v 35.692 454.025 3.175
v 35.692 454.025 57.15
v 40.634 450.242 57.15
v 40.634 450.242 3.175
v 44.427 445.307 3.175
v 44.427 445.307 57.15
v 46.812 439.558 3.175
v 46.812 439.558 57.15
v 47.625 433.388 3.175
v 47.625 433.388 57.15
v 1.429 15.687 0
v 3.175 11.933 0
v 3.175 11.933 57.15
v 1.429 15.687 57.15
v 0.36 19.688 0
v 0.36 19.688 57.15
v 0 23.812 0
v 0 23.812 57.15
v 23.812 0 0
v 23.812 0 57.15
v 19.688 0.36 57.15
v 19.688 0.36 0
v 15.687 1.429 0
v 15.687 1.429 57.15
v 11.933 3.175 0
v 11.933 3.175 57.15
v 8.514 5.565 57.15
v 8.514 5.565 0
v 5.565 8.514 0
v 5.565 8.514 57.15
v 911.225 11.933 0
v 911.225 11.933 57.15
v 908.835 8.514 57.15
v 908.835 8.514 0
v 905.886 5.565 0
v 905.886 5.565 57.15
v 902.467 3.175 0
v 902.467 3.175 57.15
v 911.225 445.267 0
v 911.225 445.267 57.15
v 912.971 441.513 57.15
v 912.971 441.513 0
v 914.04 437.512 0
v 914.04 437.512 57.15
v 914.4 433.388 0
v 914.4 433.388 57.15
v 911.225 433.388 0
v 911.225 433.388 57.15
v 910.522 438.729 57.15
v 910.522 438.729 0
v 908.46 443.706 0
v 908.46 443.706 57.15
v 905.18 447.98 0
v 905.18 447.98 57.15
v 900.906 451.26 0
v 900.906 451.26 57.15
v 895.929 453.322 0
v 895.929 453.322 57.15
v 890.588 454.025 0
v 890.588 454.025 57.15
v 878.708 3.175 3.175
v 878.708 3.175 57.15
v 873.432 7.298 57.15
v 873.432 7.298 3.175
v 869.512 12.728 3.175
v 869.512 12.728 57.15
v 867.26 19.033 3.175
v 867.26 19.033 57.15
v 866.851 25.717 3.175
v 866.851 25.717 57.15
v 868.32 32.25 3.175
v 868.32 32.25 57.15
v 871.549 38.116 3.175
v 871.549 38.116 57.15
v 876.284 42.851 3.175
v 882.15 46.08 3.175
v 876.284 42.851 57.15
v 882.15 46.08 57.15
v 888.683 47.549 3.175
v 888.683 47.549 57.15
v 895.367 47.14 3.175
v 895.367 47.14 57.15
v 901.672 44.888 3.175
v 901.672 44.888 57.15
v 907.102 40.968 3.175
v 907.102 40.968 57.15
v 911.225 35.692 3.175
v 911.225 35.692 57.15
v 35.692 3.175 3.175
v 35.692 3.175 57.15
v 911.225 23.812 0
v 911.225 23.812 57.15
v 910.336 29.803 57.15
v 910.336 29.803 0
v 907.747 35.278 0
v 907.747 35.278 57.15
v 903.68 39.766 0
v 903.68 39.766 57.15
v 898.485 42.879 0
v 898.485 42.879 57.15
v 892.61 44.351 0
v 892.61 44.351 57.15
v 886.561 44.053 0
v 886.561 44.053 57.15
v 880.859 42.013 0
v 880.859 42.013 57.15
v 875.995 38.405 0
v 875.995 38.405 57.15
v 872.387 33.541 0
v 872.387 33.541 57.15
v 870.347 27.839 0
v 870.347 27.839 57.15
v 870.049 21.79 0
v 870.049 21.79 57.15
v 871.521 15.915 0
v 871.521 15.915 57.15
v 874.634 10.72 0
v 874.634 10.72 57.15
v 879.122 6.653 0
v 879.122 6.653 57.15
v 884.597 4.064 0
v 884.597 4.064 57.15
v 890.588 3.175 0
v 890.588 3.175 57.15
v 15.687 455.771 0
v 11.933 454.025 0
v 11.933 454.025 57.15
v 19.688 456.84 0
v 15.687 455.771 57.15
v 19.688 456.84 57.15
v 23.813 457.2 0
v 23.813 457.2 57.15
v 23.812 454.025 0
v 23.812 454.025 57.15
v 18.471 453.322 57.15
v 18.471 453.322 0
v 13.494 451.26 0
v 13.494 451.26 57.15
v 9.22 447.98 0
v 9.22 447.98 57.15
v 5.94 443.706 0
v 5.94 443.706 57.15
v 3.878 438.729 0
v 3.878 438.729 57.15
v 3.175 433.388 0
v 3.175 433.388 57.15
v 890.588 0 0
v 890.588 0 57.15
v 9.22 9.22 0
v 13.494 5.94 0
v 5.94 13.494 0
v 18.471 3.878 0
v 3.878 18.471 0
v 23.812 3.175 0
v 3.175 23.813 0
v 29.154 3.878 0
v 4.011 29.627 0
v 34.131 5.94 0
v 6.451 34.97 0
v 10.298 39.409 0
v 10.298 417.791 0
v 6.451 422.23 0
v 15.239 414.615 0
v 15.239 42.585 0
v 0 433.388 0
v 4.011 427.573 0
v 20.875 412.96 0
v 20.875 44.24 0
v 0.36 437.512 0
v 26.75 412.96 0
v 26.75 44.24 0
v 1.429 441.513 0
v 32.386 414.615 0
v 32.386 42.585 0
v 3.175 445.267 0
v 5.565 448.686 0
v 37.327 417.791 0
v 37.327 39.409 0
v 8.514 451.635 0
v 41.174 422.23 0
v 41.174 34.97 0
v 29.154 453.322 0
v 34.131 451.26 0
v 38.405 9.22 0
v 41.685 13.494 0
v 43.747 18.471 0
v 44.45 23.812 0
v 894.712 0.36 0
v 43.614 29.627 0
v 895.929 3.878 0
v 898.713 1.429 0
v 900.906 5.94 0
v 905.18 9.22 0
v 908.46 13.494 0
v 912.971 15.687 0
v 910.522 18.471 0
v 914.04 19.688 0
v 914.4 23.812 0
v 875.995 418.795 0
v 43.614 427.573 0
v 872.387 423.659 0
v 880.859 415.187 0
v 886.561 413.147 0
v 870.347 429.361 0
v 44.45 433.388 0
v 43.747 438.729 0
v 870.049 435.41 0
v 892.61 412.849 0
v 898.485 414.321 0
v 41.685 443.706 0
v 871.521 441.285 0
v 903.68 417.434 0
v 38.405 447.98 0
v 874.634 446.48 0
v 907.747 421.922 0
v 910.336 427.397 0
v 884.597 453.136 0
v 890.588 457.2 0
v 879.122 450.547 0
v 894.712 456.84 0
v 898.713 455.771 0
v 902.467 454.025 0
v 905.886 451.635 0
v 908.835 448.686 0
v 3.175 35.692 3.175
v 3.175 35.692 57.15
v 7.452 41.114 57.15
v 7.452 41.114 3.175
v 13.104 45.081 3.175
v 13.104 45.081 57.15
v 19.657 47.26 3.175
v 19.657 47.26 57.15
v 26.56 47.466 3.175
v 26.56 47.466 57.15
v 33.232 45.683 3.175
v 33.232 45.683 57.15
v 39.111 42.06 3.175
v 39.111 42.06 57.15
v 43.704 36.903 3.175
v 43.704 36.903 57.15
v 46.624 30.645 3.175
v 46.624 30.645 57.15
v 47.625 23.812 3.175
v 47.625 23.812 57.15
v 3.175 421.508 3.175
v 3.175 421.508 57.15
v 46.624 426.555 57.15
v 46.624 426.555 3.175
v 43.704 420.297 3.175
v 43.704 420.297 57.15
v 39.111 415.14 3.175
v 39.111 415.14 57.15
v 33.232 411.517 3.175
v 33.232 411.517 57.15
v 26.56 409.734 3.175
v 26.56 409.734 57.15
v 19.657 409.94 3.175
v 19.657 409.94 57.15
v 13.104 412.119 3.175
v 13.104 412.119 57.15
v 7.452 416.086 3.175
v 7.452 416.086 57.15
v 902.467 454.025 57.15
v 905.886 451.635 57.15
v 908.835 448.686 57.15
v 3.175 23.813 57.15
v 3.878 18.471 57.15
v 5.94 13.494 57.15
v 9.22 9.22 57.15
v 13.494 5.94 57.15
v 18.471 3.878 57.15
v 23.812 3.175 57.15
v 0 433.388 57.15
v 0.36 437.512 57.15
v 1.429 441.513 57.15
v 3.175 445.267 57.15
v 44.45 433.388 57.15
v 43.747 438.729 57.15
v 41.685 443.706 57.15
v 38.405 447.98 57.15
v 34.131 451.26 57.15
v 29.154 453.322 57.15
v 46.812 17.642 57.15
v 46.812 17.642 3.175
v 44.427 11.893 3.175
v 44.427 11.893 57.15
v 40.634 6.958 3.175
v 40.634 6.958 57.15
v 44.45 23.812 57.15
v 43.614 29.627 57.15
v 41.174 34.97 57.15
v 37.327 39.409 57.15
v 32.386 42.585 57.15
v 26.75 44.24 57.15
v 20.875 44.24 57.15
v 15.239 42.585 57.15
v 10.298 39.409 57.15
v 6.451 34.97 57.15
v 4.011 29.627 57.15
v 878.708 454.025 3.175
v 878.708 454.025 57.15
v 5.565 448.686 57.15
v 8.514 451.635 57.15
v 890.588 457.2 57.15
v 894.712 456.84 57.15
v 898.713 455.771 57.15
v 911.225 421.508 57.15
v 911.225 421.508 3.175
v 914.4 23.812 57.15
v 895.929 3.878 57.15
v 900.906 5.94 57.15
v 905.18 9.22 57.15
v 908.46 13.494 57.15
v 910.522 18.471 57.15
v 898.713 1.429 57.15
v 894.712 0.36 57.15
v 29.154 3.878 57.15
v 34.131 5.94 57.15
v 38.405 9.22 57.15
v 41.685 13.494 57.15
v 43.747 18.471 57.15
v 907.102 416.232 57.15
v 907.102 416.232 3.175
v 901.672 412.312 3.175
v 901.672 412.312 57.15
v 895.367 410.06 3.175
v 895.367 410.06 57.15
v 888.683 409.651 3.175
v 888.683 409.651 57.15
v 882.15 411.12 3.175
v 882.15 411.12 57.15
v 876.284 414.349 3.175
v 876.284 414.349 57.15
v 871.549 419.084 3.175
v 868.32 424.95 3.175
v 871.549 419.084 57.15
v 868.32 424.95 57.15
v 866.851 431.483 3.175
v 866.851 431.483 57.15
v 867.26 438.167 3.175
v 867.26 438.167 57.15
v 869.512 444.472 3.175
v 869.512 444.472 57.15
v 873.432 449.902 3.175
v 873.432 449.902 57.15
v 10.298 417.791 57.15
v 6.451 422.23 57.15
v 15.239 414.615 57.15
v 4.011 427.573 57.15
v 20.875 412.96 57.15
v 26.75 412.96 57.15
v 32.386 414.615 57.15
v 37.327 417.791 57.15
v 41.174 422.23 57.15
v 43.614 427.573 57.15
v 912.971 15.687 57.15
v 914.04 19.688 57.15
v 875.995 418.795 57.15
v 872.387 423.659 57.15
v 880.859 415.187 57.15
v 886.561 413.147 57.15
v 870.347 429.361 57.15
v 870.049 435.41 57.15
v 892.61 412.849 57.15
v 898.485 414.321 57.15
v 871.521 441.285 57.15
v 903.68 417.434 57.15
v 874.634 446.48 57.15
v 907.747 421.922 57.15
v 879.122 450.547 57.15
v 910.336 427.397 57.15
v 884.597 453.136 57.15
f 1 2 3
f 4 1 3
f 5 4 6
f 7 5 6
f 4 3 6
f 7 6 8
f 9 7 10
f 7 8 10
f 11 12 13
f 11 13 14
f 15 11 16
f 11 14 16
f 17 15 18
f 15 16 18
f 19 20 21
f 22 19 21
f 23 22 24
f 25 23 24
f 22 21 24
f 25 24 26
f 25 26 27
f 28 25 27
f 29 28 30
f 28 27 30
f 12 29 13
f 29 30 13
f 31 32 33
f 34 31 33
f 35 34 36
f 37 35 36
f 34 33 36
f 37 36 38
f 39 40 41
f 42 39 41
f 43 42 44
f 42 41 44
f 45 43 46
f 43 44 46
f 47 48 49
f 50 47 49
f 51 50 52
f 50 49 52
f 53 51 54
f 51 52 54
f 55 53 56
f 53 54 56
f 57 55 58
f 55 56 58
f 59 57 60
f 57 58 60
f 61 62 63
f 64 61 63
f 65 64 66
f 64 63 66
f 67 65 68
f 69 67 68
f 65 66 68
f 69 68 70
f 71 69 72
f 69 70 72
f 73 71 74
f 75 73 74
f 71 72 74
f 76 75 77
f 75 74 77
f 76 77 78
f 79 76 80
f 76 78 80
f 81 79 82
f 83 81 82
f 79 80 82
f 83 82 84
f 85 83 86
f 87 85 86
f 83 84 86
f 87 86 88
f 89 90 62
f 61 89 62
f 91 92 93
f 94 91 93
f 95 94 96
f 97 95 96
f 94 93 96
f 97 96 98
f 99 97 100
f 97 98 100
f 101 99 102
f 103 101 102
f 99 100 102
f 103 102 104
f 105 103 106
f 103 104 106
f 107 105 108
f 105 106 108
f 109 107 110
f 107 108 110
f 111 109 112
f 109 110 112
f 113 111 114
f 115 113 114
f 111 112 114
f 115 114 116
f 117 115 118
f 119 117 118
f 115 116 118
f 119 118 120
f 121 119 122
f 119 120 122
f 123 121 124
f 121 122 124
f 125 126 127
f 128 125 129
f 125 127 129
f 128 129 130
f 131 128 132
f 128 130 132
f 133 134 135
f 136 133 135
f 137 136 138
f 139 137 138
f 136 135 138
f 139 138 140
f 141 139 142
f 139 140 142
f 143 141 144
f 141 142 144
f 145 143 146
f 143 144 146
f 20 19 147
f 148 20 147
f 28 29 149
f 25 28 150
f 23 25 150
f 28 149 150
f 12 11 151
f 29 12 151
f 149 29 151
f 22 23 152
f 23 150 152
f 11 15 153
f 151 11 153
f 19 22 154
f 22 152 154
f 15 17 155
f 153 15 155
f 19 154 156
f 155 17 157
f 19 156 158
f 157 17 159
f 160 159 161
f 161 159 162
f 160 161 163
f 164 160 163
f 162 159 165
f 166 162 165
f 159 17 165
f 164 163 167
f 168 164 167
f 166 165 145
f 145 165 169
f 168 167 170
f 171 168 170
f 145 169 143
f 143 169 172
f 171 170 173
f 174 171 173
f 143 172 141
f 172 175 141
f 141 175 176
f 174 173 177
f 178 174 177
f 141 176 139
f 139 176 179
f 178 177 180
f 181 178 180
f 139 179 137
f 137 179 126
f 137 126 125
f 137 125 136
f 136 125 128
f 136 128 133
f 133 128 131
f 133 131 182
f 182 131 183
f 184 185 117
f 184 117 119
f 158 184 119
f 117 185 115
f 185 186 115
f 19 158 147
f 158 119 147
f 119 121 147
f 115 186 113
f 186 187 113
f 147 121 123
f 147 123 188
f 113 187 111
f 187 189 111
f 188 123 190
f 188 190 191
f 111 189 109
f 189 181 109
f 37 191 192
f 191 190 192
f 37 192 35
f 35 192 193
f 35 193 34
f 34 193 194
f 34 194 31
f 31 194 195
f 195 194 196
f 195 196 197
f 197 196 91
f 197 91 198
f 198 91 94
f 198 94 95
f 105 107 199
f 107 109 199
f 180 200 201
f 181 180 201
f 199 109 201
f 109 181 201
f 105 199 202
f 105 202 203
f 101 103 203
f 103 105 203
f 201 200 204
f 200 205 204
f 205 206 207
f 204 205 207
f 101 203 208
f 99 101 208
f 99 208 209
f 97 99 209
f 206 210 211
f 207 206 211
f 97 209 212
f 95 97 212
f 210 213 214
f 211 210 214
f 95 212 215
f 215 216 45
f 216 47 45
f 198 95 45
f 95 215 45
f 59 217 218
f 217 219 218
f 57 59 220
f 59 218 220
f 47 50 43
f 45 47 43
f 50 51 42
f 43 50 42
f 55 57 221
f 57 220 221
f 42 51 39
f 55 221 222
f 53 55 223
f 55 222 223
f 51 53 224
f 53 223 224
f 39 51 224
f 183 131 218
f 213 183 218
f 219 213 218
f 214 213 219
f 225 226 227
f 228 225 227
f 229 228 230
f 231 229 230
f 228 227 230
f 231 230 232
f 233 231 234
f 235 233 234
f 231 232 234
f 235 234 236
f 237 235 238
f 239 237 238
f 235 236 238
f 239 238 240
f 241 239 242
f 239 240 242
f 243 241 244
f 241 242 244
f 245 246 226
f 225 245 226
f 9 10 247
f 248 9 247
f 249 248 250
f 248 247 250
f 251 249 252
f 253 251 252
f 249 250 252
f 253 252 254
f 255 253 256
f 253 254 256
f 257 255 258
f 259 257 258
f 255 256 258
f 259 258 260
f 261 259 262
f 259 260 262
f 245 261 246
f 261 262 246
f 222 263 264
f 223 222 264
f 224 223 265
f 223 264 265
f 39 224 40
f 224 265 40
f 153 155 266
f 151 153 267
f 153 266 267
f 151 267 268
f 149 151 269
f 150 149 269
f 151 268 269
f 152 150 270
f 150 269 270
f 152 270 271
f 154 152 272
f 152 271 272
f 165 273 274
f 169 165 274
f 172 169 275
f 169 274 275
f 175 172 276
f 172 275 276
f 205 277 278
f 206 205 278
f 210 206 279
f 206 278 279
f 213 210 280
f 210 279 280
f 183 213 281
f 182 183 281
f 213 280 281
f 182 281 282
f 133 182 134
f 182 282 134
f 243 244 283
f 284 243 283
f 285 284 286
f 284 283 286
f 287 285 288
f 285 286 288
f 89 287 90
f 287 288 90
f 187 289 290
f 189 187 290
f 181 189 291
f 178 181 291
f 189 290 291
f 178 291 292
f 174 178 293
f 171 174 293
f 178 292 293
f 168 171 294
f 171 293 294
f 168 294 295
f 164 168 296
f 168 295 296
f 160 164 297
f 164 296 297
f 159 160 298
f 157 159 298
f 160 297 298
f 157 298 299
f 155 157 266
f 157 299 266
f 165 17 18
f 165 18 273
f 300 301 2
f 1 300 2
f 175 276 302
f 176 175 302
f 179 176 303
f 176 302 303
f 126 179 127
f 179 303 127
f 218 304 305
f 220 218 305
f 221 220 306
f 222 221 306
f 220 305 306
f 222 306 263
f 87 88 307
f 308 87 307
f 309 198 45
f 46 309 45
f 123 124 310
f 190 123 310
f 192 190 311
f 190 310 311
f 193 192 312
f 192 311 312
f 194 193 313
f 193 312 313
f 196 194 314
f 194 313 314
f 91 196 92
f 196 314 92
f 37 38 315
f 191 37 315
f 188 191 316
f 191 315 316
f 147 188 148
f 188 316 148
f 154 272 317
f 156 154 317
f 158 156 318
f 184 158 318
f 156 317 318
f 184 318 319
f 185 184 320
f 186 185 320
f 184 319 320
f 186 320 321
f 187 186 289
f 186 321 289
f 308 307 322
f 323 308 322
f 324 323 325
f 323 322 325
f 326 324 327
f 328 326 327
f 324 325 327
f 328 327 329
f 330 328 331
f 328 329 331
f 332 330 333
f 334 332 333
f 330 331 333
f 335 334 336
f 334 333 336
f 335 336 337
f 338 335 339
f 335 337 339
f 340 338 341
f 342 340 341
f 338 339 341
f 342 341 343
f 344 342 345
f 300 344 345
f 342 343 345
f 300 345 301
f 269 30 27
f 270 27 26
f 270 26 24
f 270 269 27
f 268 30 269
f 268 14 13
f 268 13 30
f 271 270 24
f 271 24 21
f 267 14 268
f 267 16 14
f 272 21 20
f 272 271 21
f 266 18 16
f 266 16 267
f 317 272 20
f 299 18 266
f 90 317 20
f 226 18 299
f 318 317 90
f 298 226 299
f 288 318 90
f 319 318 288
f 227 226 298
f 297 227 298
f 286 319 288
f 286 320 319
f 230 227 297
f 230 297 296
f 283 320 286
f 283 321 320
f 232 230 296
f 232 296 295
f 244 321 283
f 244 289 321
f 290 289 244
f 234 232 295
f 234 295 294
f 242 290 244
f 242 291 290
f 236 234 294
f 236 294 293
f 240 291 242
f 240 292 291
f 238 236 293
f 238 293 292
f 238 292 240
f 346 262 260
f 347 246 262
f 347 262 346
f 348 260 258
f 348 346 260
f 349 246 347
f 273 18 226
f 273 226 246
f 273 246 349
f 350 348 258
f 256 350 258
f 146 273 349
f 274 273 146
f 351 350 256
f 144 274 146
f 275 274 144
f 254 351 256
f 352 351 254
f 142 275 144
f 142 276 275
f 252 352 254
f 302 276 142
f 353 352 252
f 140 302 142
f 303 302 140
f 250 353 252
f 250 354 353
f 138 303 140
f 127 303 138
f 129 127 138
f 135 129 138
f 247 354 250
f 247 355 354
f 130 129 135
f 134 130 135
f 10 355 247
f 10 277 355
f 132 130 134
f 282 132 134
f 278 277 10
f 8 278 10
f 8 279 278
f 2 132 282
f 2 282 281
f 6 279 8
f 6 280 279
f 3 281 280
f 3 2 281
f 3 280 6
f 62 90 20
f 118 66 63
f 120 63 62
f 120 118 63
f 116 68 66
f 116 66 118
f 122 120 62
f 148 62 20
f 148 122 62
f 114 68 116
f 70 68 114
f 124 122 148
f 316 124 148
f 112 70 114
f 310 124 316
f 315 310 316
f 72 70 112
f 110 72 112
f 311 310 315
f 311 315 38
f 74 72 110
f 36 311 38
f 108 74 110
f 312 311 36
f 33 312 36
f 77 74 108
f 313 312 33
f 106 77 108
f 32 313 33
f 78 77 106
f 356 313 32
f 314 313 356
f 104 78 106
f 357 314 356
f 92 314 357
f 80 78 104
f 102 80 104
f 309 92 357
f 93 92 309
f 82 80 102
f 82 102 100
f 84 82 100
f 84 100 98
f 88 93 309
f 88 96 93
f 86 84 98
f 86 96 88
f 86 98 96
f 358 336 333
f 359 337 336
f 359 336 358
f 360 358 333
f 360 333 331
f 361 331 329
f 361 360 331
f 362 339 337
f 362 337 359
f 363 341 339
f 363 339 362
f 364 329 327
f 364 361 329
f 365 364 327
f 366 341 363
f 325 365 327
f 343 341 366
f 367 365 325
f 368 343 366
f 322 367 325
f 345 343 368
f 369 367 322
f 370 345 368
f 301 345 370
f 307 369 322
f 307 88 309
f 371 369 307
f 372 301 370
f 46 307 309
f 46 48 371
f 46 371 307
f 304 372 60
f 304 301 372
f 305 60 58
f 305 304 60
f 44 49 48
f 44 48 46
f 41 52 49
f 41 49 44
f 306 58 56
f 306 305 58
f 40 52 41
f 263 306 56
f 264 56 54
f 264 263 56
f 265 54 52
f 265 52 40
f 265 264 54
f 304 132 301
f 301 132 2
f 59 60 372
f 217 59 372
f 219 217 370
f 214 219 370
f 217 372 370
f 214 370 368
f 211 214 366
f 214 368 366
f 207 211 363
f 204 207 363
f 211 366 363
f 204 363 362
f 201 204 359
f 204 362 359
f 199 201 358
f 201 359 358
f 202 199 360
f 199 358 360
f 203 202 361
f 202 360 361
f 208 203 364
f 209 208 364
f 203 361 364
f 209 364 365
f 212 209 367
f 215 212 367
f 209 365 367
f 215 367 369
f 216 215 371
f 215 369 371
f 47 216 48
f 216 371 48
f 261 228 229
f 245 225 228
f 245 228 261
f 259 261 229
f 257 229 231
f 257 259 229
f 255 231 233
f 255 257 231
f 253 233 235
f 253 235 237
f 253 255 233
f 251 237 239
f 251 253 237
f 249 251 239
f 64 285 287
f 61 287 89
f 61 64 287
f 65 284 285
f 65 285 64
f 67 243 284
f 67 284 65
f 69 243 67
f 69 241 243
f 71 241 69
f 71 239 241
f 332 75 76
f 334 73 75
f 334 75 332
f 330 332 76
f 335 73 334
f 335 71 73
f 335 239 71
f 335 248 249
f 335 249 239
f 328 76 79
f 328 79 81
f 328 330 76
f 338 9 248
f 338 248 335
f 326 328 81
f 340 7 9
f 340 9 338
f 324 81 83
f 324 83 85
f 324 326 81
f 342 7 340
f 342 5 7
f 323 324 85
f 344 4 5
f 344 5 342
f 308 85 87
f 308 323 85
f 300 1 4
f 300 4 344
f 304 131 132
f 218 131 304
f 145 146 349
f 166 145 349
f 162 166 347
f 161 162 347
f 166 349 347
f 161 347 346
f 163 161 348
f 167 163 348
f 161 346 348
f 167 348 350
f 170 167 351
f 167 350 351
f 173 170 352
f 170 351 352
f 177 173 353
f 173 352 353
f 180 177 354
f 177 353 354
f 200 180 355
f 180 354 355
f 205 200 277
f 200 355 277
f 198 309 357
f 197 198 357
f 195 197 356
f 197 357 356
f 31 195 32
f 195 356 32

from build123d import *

# Parameters (mm, degrees)
F2_W     = 914.4
F2_H     = 457.2
F3_DEPTH = 57.15
F5_DEPTH = 53.975
F6_DEPTH = 57.15


# Not quite as in the source:
# - a length typed as a fraction of an inch, garbled in the dataset ("3 / 203.2 mm" for 3/8 in), is restored


with BuildPart() as f3:
    # F2 (on Top) → F3 (new body)
    with BuildSketch(Plane.XY):
        with Locations((457.2, 228.6)):
            Rectangle(F2_W, F2_H)
    extrude(amount=F3_DEPTH)

    # F4 (on face) → F5 (cut)
    with BuildSketch(Plane.XY.offset(57.15)):
        with BuildLine():
            ThreePointArc((47.625, 23.8125), (44.4270821412, 11.8930134592), (35.692262203, 3.175))
            Line((35.692262203, 3.175), (878.707737797, 3.175))
            ThreePointArc((878.707737797, 3.175), (873.749519773, 40.650480227), (911.225, 35.692262203))
            Line((911.225, 35.692262203), (911.225, 421.507737797))
            ThreePointArc((911.225, 421.507737797), (873.749519773, 416.549519773), (878.707737797, 454.025))
            Line((878.707737797, 454.025), (35.692262203, 454.025))
            ThreePointArc((35.692262203, 454.025), (44.4270821412, 445.3069865408), (47.625, 433.3875))
            ThreePointArc((47.625, 433.3875), (29.9608610621, 410.3824394154), (3.175, 421.507737797))
            Line((3.175, 421.507737797), (3.175, 35.692262203))
            ThreePointArc((3.175, 35.692262203), (29.9608610621, 46.8175605846), (47.625, 23.8125))
        make_face()
    extrude(amount=-F5_DEPTH, mode=Mode.SUBTRACT)

    # F4 (on face) → F6 (cut)
    with BuildSketch(Plane.XY.offset(57.15)):
        with BuildLine():
            Line((11.932737797, 3.175), (3.175, 3.175))
            Line((3.175, 3.175), (3.175, 11.932737797))
            ThreePointArc((3.175, 11.932737797), (0.8074394304, 17.6641388819), (0, 23.8124998841))
            Line((0, 23.8124998841), (0, 0))
            Line((0, 0), (23.8125, 0))
            ThreePointArc((23.8125, 0), (17.6641389379, 0.8074394154), (11.932737797, 3.175))
        make_face()
        with BuildLine():
            Line((3.175, 11.932737797), (3.175, 3.175))
            Line((3.175, 3.175), (11.932737797, 3.175))
            ThreePointArc((11.932737797, 3.175), (6.974519773, 6.974519773), (3.175, 11.932737797))
        make_face()
        with BuildLine():
            ThreePointArc((3.175, 23.8125001882), (9.2195837367, 9.2195838698), (23.8125, 3.175))
            ThreePointArc((23.8125, 3.175), (38.4054161967, 9.2195838033), (44.45, 23.8125))
            ThreePointArc((44.45, 23.8125), (23.8125000941, 44.45), (3.175, 23.8125001882))
        make_face()
        with BuildLine():
            ThreePointArc((23.8124998376, 454.025), (9.2195837458, 447.9804161393), (3.175, 433.3875))
            ThreePointArc((3.175, 433.3875), (23.8125, 412.75), (44.45, 433.3875))
            ThreePointArc((44.45, 433.3875), (38.4054161393, 447.9804162542), (23.8124998376, 454.025))
        make_face()
        with BuildLine():
            Line((3.175, 454.025), (3.175, 445.267262203))
            ThreePointArc((3.175, 445.267262203), (6.974519773, 450.225480227), (11.932737797, 454.025))
            Line((11.932737797, 454.025), (3.175, 454.025))
        make_face()
        with BuildLine():
            Line((0, 457.2), (0, 433.3875))
            ThreePointArc((0, 433.3875), (0.8074394154, 439.5358610621), (3.175, 445.267262203))
            Line((3.175, 445.267262203), (3.175, 454.025))
            Line((3.175, 454.025), (11.932737797, 454.025))
            ThreePointArc((11.932737797, 454.025), (17.6641390246, 456.3925606078), (23.8125001795, 457.2))
            Line((23.8125001795, 457.2), (0, 457.2))
        make_face()
        with BuildLine():
            ThreePointArc((902.467262203, 454.025), (907.425480227, 450.225480227), (911.225, 445.267262203))
            Line((911.225, 445.267262203), (911.225, 454.025))
            Line((911.225, 454.025), (902.467262203, 454.025))
        make_face()
        with BuildLine():
            ThreePointArc((911.225, 445.267262203), (913.5925605846, 439.5358610621), (914.4, 433.3875))
            Line((914.4, 433.3875), (914.4, 457.2))
            Line((914.4, 457.2), (890.5875, 457.2))
            ThreePointArc((890.5875, 457.2), (896.7358610621, 456.3925605846), (902.467262203, 454.025))
            Line((902.467262203, 454.025), (911.225, 454.025))
            Line((911.225, 454.025), (911.225, 445.267262203))
        make_face()
        with BuildLine():
            ThreePointArc((890.5875, 454.025), (875.9945838033, 418.7945838033), (911.225, 433.3875))
            ThreePointArc((911.225, 433.3875), (905.1804161967, 447.9804161967), (890.5875, 454.025))
        make_face()
        with BuildLine():
            ThreePointArc((911.225, 11.932737797), (907.425480227, 6.974519773), (902.467262203, 3.175))
            Line((902.467262203, 3.175), (911.225, 3.175))
            Line((911.225, 3.175), (911.225, 11.932737797))
        make_face()
        with BuildLine():
            ThreePointArc((902.467262203, 3.175), (896.7358610621, 0.8074394154), (890.5875, 0))
            Line((890.5875, 0), (914.4, 0))
            Line((914.4, 0), (914.4, 23.8125))
            ThreePointArc((914.4, 23.8125), (913.5925605846, 17.6641389379), (911.225, 11.932737797))
            Line((911.225, 11.932737797), (911.225, 3.175))
            Line((911.225, 3.175), (902.467262203, 3.175))
        make_face()
        with BuildLine():
            ThreePointArc((911.225, 23.8125), (875.9945838033, 38.4054161967), (890.5875, 3.175))
            ThreePointArc((890.5875, 3.175), (905.1804161967, 9.2195838033), (911.225, 23.8125))
        make_face()
    extrude(amount=-F6_DEPTH, mode=Mode.SUBTRACT)


solid = f3.part
